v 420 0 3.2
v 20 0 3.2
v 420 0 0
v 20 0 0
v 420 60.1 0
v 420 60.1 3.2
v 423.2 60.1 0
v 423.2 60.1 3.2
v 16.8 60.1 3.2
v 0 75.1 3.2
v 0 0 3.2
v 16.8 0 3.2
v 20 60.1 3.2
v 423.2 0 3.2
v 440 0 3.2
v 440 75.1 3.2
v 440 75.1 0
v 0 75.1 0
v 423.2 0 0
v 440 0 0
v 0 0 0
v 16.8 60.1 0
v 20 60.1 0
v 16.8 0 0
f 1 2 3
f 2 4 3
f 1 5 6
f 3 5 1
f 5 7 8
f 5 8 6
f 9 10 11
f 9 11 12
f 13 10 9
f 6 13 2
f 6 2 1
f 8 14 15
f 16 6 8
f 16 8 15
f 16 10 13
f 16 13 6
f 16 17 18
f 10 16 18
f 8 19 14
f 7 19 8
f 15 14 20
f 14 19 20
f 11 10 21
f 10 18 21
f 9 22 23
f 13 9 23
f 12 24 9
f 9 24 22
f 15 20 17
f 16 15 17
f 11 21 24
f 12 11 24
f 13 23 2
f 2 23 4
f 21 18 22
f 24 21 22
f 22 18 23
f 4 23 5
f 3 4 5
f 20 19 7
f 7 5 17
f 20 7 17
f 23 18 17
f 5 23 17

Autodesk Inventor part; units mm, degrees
ref_plane "YZ Plane" through (0, 0, 0) normal (1, 0, 0) x (0, 1, 0)
ref_plane "XZ Plane" through (0, 0, 0) normal (0, 1, 0) x (-1, 0, 0)
ref_plane "XY Plane" through (0, 0, 0) normal (0, 0, 1) x (1, 0, 0)
sketch "Sketch1" plane through (0, 0, 0) normal (0, 0, 1) x (1, 0, 0)
  line L0 (0, 0) -> (440, 0)
  line L1 (440, 0) -> (440, 75.1)
  line L2 (440, 75.1) -> (0, 75.1)
  line L3 (0, 75.1) -> (0, 0)
  line L4 (16.8, 60.1) -> (20, 60.1)
  line L5 (20, 60.1) -> (20, 0)
  line L6 (20, 0) -> (16.8, 0)
  line L7 (16.8, 0) -> (16.8, 60.1)
  line L8 (220, 75.1) -> (220, 0) construction
  line L9 (423.2, 60.1) -> (420, 60.1)
  line L10 (420, 60.1) -> (420, 0)
  line L11 (420, 0) -> (423.2, 0)
  line L12 (423.2, 0) -> (423.2, 60.1)
  point P0 (420, 0)
  dimension "d0" = 440
  dimension "d1" = 75.1
  dimension "d2" = 200
  dimension "d3" = 3.2
  dimension "d4" = 15
extrude "Extrusion1" add sketch "Sketch1" along normal blind 3.2 contours L3 L2 L1 L0 L12 L9 L10 L5 L4 L7
properties part number "PARED_ESTRUCTURAL" material "MDF Medium Density Fiberboard"
